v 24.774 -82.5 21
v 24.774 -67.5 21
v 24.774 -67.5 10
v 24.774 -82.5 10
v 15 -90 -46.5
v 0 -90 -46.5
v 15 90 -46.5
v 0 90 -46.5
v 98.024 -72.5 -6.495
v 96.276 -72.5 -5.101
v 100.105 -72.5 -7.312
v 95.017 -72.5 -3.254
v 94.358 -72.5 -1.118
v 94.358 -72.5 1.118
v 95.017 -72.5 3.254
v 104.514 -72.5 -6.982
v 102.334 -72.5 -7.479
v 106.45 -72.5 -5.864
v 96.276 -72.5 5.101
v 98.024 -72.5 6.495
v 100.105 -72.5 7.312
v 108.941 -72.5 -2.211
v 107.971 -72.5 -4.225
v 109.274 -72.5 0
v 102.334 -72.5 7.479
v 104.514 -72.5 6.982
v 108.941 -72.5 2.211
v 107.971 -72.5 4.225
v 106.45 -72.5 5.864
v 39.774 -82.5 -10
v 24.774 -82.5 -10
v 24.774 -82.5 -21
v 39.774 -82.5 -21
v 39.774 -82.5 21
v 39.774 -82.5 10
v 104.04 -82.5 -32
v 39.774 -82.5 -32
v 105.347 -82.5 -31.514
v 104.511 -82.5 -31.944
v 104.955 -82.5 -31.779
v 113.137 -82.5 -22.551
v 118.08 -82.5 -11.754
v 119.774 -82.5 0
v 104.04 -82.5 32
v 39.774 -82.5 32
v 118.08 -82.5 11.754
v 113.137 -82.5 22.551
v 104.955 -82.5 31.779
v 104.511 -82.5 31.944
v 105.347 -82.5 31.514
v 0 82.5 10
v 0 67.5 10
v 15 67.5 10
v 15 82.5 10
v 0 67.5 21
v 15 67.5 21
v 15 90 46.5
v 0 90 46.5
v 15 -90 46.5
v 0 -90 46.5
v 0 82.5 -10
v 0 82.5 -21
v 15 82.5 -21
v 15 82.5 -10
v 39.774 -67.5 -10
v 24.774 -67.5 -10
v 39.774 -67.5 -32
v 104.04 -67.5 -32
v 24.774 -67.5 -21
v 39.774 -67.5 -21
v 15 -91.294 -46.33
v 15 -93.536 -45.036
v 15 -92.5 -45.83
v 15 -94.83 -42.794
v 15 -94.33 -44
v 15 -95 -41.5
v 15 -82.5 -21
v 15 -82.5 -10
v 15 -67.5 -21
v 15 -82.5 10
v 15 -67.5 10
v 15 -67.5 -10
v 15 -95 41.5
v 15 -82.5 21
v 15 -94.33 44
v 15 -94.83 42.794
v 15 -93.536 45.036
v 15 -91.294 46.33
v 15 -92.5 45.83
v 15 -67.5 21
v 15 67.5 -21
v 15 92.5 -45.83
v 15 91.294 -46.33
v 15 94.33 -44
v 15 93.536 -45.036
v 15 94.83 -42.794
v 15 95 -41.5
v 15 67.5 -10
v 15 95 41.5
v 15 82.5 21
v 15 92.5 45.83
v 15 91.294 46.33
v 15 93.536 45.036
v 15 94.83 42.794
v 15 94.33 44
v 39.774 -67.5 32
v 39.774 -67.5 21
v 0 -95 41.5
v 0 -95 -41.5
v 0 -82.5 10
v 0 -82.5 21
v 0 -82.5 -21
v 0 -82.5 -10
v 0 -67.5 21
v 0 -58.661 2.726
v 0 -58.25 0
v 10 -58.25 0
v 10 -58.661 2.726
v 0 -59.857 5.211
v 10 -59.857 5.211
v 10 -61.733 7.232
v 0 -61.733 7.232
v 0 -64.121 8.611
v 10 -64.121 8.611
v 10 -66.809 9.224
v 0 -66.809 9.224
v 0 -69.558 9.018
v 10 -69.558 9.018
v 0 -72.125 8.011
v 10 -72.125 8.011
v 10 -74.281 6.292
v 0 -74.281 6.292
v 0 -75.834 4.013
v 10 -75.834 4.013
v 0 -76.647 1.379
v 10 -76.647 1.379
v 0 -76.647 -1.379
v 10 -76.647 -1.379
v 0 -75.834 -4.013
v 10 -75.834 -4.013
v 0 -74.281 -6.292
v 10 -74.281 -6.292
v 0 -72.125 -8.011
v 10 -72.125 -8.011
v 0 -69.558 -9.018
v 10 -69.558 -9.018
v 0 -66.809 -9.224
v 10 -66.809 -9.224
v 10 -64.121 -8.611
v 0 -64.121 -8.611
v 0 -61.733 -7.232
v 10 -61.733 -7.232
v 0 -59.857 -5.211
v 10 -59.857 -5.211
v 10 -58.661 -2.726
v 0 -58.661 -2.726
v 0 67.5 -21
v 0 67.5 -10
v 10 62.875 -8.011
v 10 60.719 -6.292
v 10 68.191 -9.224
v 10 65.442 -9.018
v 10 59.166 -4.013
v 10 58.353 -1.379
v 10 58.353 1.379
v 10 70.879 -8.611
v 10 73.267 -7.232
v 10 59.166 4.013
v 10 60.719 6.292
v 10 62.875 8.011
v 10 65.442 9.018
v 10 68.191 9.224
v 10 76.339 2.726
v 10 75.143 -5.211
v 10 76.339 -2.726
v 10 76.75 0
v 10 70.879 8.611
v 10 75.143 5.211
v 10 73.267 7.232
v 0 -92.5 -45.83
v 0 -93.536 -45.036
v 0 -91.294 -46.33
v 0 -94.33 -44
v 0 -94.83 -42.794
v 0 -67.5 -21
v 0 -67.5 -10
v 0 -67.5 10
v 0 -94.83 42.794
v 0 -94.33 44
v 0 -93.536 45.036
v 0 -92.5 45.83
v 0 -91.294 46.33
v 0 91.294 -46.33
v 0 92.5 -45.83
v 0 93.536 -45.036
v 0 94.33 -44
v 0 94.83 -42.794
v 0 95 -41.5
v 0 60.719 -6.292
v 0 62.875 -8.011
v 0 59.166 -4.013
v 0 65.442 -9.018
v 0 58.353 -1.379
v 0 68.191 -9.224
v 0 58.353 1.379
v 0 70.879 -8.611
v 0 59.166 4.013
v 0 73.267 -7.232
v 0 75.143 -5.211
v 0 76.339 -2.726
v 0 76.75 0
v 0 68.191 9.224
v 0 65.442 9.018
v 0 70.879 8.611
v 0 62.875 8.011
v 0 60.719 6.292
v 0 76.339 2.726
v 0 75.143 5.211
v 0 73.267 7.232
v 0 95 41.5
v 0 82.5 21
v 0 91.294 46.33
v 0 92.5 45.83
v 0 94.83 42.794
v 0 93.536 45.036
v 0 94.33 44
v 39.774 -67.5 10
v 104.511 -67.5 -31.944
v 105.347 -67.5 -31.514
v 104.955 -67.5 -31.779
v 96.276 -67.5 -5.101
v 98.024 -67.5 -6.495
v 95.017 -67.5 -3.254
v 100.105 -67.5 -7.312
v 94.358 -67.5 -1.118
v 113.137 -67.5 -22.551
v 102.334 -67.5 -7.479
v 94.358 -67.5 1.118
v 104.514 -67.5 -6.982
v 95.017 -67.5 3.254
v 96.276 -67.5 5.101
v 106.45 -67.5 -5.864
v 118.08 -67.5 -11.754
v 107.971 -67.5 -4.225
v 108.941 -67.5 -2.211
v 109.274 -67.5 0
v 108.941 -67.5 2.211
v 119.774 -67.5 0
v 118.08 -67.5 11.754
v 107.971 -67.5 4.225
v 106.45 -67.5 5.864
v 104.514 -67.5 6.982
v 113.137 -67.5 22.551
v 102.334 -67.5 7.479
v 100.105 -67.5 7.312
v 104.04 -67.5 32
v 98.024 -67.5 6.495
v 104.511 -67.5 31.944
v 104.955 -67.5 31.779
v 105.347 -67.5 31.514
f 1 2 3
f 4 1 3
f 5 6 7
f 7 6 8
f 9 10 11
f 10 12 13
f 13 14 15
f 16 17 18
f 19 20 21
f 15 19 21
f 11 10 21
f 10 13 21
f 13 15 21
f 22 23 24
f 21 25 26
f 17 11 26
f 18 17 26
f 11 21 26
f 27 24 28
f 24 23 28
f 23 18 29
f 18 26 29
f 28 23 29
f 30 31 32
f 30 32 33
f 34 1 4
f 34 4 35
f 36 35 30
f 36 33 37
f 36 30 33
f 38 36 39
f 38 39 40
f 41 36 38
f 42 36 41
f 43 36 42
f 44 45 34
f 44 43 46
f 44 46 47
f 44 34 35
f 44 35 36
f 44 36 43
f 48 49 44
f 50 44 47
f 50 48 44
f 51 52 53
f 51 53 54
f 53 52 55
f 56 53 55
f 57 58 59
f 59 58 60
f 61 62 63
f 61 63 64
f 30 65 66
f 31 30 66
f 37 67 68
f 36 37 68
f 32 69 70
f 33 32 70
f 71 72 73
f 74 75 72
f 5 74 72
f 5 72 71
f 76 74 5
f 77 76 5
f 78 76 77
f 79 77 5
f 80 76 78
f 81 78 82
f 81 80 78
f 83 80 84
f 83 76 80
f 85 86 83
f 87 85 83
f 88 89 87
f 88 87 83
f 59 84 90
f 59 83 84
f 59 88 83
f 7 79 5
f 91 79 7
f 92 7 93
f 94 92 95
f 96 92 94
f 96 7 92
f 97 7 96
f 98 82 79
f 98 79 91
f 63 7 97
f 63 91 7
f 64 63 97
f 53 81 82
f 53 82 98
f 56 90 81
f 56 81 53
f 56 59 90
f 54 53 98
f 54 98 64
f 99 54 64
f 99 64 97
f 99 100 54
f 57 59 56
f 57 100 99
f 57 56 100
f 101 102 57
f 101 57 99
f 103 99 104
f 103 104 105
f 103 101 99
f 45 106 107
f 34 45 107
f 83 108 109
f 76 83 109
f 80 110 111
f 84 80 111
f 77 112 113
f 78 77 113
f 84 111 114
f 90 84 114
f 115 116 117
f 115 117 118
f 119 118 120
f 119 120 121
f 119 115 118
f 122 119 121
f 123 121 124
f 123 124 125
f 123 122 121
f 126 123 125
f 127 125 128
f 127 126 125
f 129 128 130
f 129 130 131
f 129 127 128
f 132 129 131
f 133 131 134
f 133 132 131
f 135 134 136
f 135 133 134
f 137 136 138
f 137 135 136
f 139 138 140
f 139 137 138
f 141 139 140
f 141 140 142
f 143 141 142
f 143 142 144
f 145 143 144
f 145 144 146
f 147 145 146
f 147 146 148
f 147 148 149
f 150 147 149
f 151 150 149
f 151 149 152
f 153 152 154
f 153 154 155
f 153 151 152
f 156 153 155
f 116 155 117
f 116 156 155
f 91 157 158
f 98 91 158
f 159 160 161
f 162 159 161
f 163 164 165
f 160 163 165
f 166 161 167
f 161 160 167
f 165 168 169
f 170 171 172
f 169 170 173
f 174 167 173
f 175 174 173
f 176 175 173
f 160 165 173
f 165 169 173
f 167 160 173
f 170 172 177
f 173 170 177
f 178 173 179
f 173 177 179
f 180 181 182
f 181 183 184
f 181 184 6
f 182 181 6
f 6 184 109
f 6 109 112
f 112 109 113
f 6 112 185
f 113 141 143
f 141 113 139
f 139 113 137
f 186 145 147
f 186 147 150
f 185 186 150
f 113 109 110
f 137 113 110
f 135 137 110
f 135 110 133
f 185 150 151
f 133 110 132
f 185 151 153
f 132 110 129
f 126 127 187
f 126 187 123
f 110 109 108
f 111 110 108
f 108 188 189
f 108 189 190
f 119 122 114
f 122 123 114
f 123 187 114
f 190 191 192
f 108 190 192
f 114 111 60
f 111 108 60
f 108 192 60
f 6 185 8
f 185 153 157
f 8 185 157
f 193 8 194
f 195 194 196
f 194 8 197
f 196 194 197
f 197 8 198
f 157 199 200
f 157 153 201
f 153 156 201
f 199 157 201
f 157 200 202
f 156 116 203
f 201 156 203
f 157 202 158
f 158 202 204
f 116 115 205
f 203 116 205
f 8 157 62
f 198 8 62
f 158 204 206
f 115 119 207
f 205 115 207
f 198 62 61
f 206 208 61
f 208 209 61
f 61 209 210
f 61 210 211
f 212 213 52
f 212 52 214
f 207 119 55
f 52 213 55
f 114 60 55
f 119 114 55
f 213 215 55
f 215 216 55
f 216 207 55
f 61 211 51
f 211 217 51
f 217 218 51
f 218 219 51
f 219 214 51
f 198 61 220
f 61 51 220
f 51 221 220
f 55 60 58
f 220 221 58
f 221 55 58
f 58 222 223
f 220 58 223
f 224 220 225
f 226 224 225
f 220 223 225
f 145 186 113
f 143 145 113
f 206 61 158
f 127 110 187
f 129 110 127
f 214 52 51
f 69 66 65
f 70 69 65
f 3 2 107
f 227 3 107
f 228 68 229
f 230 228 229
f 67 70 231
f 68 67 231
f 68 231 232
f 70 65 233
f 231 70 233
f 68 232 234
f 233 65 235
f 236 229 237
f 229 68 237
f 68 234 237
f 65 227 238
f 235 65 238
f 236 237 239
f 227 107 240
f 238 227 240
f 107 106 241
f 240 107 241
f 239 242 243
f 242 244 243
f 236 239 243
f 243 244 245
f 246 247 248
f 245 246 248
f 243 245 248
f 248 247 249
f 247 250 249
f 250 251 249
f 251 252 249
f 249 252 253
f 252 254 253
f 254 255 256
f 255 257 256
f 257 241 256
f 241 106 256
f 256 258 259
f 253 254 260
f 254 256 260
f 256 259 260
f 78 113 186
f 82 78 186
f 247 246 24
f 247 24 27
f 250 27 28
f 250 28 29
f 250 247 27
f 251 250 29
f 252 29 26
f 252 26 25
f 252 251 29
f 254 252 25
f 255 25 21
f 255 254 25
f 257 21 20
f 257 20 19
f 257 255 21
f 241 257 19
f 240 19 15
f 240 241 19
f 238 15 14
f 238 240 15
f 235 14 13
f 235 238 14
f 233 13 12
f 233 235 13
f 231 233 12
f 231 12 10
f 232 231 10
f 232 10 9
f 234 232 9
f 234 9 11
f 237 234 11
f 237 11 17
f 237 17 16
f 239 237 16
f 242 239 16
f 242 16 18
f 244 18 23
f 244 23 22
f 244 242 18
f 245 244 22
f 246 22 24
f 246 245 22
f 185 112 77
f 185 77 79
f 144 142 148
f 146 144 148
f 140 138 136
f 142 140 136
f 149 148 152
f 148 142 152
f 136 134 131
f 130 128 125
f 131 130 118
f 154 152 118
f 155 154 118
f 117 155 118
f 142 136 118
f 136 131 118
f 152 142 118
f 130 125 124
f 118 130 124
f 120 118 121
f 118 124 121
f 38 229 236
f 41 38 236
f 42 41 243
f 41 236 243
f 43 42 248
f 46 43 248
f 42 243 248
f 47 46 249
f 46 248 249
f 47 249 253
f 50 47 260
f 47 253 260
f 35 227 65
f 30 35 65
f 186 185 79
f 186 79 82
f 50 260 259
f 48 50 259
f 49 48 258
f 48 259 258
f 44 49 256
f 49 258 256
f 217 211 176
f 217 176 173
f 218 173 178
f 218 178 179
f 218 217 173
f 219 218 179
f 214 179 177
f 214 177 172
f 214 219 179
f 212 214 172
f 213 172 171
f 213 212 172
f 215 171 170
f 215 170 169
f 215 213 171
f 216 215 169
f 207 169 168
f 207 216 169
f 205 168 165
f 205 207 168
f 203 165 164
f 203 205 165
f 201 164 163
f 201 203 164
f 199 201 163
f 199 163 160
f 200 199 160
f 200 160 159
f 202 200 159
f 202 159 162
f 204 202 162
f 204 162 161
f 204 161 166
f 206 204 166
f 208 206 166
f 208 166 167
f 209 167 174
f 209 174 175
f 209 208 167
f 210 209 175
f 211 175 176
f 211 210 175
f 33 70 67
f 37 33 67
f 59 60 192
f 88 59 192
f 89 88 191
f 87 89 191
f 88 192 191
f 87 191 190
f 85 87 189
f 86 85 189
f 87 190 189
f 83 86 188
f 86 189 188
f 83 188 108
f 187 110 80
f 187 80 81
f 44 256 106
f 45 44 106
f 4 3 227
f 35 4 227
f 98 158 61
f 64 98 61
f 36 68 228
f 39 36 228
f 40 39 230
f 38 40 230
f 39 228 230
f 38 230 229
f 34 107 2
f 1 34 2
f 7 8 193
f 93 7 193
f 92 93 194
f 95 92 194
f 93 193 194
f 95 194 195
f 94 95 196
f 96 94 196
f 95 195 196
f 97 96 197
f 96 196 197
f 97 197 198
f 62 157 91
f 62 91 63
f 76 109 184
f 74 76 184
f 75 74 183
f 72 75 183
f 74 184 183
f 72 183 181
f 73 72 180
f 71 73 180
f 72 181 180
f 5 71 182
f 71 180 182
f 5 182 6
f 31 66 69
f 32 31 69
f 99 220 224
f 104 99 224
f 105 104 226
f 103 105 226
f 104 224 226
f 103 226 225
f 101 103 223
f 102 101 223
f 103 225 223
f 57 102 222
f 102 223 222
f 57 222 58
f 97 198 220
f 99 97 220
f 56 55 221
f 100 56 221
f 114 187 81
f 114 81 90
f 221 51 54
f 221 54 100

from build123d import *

# Parameters (mm, degrees)
F0_W     = 15
F0_H     = 11
F0_R     = 9.25
F1_DEPTH = 15
F3_R     = 7.5
F4_DEPTH = 15
F5_DEPTH = 5
F6_DEPTH = 10


with BuildPart() as f1:
    # F0 (on Right) → F1 (new body)
    with BuildSketch(Plane.YZ):
        with BuildLine():
            Line((-90, -46.5), (90, -46.5))
            ThreePointArc((90, -46.5), (93.535534, -45.035534), (95, -41.5))
            Line((95, -41.5), (95, 41.5))
            ThreePointArc((95, 41.5), (93.535534, 45.035534), (90, 46.5))
            Line((90, 46.5), (-90, 46.5))
            ThreePointArc((-90, 46.5), (-93.535534, 45.035534), (-95, 41.5))
            Line((-95, 41.5), (-95, -41.5))
            ThreePointArc((-95, -41.5), (-93.535534, -45.035534), (-90, -46.5))
        make_face()
        with Locations((-75, -15.5)):
            Rectangle(F0_W, F0_H, mode=Mode.SUBTRACT)
        with Locations((75, -15.5)):
            Rectangle(F0_W, F0_H, mode=Mode.SUBTRACT)
        with Locations((-67.5, 0)):
            Circle(F0_R, mode=Mode.SUBTRACT)
        with Locations((-75, 15.5)):
            Rectangle(F0_W, F0_H, mode=Mode.SUBTRACT)
        with Locations((67.5, 0)):
            Circle(F0_R, mode=Mode.SUBTRACT)
        with Locations((75, 15.5)):
            Rectangle(F0_W, F0_H, mode=Mode.SUBTRACT)
        with Locations((-67.5, 0)):
            Circle(F0_R)
        with Locations((67.5, 0)):
            Circle(F0_R)
    extrude(amount=F1_DEPTH)

    # F0 (on Right) → F6 (cut)
    with BuildSketch(Plane.YZ):
        with Locations((67.5, 0)):
            Circle(F0_R)
        with Locations((-67.5, 0)):
            Circle(F0_R)
    extrude(amount=F6_DEPTH, mode=Mode.SUBTRACT)


with BuildPart() as f4:
    # F3 (on offset) → F4 (new body)
    with BuildSketch(Plane.XZ.offset(67.5)):
        with BuildLine():
            ThreePointArc((105.347357, 31.513877), (104.73761, 31.874534), (104.040385, 32))
            Line((104.040385, 32), (39.77389, 32))
            Line((39.77389, 32), (39.77389, 21))
            Line((39.77389, 21), (24.77389, 21))
            Line((24.77389, 21), (24.77389, 10))
            Line((24.77389, 10), (39.77389, 10))
            Line((39.77389, 10), (39.77389, -10))
            Line((39.77389, -10), (24.77389, -10))
            Line((24.77389, -10), (24.77389, -21))
            Line((24.77389, -21), (39.77389, -21))
            Line((39.77389, -21), (39.77389, -32))
            Line((39.77389, -32), (104.040385, -32))
            ThreePointArc((104.040385, -32), (104.73761, -31.874534), (105.347357, -31.513877))
            ThreePointArc((105.347357, -31.513877), (119.77389, 0), (105.347357, 31.513877))
        make_face()
        with Locations((101.77389, 0)):
            Circle(F3_R, mode=Mode.SUBTRACT)
        with Locations((101.77389, 0)):
            Circle(F3_R)
    extrude(amount=F4_DEPTH)

    # F3 (on offset) → F5 (cut)
    with BuildSketch(Plane.XZ.offset(67.5)):
        with Locations((101.77389, 0)):
            Circle(F3_R)
    extrude(amount=F5_DEPTH, mode=Mode.SUBTRACT)


solid = Compound([f1.part, f4.part])
